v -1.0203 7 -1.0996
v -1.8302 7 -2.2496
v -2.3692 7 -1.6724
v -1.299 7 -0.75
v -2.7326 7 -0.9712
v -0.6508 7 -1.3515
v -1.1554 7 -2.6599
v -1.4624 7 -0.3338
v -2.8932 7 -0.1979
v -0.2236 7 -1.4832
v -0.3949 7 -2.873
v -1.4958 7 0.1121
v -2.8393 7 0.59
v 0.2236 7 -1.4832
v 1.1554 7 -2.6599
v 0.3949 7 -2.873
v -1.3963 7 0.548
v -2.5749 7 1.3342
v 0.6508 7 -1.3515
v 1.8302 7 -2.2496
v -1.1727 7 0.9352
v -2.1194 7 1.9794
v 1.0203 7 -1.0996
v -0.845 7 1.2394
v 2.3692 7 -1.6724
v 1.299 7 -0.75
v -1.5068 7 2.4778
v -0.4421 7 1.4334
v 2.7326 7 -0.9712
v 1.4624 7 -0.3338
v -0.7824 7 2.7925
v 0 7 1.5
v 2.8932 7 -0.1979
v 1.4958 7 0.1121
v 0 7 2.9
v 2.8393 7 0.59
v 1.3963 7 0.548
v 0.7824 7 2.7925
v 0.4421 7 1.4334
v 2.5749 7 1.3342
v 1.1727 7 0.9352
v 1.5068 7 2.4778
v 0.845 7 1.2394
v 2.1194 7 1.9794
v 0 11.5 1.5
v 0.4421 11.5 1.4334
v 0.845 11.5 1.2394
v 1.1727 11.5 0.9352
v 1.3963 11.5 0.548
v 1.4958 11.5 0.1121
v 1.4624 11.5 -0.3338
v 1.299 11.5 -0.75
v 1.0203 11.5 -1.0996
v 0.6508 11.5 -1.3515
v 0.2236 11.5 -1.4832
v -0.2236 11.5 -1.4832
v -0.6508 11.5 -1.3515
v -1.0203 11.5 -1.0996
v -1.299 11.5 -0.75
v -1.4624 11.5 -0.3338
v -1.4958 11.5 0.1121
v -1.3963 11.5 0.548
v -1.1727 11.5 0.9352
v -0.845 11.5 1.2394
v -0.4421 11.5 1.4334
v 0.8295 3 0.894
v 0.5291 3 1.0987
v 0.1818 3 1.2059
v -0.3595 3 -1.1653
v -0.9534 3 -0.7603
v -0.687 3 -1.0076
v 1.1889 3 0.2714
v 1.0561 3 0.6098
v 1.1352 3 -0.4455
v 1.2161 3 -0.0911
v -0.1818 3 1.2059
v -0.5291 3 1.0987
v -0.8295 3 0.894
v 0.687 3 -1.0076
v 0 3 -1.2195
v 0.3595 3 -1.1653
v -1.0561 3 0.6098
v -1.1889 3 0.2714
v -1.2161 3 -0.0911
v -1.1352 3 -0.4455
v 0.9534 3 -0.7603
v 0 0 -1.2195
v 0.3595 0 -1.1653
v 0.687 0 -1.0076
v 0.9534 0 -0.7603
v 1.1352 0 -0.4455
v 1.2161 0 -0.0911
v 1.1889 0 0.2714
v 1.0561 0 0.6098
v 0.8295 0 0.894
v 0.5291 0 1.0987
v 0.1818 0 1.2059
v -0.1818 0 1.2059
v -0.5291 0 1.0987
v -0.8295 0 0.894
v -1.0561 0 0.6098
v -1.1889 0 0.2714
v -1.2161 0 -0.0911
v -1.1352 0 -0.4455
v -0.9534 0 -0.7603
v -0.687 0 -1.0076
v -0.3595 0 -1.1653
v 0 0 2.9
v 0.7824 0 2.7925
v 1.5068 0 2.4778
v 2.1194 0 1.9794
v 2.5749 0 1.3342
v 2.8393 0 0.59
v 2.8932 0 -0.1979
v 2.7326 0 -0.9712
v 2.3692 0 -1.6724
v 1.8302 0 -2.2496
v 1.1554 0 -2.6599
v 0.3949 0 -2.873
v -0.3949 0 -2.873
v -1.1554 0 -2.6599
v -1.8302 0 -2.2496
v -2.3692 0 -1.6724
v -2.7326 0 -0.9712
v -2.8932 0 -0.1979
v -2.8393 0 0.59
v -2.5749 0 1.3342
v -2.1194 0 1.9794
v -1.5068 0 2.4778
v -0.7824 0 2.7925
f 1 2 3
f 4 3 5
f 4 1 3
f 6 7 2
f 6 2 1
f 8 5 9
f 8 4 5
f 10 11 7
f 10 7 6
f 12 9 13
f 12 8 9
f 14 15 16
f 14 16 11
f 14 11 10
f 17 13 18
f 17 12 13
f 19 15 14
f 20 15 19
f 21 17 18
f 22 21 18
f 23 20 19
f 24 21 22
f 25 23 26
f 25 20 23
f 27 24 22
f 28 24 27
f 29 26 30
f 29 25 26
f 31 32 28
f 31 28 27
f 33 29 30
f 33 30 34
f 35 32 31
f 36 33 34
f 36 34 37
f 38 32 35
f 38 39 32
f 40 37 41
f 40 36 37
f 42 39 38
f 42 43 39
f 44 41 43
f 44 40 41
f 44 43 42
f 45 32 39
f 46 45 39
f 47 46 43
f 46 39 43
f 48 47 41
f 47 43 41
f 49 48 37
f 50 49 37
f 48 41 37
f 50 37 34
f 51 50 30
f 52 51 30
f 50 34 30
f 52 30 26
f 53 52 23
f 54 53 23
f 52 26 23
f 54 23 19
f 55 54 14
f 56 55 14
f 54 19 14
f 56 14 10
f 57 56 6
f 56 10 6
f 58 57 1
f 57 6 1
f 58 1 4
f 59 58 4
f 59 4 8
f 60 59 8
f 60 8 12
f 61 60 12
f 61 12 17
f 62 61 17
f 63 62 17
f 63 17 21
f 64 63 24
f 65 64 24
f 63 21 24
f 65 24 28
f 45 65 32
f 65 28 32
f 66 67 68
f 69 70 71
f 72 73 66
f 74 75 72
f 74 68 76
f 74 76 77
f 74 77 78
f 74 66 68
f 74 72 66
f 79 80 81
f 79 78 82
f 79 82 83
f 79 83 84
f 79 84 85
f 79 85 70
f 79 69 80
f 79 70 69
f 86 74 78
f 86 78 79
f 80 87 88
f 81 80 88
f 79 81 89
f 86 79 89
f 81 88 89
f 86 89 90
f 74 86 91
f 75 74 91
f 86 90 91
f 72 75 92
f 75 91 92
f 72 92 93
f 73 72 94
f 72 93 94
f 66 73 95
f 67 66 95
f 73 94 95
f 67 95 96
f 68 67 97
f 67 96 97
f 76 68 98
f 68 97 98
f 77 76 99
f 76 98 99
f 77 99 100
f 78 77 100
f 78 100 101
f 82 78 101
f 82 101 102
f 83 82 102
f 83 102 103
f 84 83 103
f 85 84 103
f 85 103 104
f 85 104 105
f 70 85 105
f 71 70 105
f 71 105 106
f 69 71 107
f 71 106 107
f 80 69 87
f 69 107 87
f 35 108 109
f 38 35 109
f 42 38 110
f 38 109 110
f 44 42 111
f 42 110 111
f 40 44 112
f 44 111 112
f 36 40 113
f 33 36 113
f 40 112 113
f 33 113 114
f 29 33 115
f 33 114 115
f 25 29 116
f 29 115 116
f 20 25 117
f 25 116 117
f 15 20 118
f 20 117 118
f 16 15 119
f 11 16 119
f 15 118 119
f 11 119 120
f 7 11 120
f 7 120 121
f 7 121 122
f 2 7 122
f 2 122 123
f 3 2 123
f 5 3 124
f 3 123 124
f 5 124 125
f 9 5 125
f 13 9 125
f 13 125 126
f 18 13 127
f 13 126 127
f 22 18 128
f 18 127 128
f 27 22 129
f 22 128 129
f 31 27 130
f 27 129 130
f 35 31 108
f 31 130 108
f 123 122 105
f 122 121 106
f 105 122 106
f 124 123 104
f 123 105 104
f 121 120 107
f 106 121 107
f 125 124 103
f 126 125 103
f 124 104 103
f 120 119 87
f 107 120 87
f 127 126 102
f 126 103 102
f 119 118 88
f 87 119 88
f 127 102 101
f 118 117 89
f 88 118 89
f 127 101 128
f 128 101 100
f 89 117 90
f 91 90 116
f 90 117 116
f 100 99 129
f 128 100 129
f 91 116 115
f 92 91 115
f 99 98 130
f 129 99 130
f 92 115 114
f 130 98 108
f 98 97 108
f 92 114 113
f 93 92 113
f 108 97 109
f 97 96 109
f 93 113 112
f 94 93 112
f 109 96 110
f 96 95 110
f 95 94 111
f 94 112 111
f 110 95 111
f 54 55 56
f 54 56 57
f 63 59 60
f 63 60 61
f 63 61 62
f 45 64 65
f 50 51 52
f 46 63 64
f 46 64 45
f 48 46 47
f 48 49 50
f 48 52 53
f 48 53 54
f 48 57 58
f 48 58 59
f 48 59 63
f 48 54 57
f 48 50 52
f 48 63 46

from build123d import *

# Parameters (mm, degrees)
OD_BASE_R           = 2.9
STANDOFF_BASE_DEPTH = 7
OD_POST_MOUNT_R     = 1.5
STANDOFF_POST_DEPTH = 4.5
ID_POST_MOUNT_R     = 1.2195
POST_MOUNT_DEPTH    = 3


with BuildPart() as part:
    # OD_base → standoff_base (new body)
    with BuildSketch(Plane(origin=(0, 0, 0), x_dir=(1, 0, 0), z_dir=(0, 1, 0))):
        with Locations(Location((0, 0, 0), (0, 0, 270))):
            Circle(OD_BASE_R)
    extrude(amount=STANDOFF_BASE_DEPTH)

    # OD_post_mount → standoff_post (add)
    with BuildSketch(Plane(origin=(0, 7, 0), x_dir=(1, 0, 0), z_dir=(0, 1, 0))):
        with Locations(Location((0, 0, 0), (0, 0, 270))):
            Circle(OD_POST_MOUNT_R)
    extrude(amount=STANDOFF_POST_DEPTH)

    # ID_post_mount → post_mount (cut)
    with BuildSketch(Plane.XZ):
        with Locations(Location((0, 0, 0), (0, 0, 270))):
            Circle(ID_POST_MOUNT_R)
    extrude(amount=-POST_MOUNT_DEPTH, mode=Mode.SUBTRACT)


solid = part.part
